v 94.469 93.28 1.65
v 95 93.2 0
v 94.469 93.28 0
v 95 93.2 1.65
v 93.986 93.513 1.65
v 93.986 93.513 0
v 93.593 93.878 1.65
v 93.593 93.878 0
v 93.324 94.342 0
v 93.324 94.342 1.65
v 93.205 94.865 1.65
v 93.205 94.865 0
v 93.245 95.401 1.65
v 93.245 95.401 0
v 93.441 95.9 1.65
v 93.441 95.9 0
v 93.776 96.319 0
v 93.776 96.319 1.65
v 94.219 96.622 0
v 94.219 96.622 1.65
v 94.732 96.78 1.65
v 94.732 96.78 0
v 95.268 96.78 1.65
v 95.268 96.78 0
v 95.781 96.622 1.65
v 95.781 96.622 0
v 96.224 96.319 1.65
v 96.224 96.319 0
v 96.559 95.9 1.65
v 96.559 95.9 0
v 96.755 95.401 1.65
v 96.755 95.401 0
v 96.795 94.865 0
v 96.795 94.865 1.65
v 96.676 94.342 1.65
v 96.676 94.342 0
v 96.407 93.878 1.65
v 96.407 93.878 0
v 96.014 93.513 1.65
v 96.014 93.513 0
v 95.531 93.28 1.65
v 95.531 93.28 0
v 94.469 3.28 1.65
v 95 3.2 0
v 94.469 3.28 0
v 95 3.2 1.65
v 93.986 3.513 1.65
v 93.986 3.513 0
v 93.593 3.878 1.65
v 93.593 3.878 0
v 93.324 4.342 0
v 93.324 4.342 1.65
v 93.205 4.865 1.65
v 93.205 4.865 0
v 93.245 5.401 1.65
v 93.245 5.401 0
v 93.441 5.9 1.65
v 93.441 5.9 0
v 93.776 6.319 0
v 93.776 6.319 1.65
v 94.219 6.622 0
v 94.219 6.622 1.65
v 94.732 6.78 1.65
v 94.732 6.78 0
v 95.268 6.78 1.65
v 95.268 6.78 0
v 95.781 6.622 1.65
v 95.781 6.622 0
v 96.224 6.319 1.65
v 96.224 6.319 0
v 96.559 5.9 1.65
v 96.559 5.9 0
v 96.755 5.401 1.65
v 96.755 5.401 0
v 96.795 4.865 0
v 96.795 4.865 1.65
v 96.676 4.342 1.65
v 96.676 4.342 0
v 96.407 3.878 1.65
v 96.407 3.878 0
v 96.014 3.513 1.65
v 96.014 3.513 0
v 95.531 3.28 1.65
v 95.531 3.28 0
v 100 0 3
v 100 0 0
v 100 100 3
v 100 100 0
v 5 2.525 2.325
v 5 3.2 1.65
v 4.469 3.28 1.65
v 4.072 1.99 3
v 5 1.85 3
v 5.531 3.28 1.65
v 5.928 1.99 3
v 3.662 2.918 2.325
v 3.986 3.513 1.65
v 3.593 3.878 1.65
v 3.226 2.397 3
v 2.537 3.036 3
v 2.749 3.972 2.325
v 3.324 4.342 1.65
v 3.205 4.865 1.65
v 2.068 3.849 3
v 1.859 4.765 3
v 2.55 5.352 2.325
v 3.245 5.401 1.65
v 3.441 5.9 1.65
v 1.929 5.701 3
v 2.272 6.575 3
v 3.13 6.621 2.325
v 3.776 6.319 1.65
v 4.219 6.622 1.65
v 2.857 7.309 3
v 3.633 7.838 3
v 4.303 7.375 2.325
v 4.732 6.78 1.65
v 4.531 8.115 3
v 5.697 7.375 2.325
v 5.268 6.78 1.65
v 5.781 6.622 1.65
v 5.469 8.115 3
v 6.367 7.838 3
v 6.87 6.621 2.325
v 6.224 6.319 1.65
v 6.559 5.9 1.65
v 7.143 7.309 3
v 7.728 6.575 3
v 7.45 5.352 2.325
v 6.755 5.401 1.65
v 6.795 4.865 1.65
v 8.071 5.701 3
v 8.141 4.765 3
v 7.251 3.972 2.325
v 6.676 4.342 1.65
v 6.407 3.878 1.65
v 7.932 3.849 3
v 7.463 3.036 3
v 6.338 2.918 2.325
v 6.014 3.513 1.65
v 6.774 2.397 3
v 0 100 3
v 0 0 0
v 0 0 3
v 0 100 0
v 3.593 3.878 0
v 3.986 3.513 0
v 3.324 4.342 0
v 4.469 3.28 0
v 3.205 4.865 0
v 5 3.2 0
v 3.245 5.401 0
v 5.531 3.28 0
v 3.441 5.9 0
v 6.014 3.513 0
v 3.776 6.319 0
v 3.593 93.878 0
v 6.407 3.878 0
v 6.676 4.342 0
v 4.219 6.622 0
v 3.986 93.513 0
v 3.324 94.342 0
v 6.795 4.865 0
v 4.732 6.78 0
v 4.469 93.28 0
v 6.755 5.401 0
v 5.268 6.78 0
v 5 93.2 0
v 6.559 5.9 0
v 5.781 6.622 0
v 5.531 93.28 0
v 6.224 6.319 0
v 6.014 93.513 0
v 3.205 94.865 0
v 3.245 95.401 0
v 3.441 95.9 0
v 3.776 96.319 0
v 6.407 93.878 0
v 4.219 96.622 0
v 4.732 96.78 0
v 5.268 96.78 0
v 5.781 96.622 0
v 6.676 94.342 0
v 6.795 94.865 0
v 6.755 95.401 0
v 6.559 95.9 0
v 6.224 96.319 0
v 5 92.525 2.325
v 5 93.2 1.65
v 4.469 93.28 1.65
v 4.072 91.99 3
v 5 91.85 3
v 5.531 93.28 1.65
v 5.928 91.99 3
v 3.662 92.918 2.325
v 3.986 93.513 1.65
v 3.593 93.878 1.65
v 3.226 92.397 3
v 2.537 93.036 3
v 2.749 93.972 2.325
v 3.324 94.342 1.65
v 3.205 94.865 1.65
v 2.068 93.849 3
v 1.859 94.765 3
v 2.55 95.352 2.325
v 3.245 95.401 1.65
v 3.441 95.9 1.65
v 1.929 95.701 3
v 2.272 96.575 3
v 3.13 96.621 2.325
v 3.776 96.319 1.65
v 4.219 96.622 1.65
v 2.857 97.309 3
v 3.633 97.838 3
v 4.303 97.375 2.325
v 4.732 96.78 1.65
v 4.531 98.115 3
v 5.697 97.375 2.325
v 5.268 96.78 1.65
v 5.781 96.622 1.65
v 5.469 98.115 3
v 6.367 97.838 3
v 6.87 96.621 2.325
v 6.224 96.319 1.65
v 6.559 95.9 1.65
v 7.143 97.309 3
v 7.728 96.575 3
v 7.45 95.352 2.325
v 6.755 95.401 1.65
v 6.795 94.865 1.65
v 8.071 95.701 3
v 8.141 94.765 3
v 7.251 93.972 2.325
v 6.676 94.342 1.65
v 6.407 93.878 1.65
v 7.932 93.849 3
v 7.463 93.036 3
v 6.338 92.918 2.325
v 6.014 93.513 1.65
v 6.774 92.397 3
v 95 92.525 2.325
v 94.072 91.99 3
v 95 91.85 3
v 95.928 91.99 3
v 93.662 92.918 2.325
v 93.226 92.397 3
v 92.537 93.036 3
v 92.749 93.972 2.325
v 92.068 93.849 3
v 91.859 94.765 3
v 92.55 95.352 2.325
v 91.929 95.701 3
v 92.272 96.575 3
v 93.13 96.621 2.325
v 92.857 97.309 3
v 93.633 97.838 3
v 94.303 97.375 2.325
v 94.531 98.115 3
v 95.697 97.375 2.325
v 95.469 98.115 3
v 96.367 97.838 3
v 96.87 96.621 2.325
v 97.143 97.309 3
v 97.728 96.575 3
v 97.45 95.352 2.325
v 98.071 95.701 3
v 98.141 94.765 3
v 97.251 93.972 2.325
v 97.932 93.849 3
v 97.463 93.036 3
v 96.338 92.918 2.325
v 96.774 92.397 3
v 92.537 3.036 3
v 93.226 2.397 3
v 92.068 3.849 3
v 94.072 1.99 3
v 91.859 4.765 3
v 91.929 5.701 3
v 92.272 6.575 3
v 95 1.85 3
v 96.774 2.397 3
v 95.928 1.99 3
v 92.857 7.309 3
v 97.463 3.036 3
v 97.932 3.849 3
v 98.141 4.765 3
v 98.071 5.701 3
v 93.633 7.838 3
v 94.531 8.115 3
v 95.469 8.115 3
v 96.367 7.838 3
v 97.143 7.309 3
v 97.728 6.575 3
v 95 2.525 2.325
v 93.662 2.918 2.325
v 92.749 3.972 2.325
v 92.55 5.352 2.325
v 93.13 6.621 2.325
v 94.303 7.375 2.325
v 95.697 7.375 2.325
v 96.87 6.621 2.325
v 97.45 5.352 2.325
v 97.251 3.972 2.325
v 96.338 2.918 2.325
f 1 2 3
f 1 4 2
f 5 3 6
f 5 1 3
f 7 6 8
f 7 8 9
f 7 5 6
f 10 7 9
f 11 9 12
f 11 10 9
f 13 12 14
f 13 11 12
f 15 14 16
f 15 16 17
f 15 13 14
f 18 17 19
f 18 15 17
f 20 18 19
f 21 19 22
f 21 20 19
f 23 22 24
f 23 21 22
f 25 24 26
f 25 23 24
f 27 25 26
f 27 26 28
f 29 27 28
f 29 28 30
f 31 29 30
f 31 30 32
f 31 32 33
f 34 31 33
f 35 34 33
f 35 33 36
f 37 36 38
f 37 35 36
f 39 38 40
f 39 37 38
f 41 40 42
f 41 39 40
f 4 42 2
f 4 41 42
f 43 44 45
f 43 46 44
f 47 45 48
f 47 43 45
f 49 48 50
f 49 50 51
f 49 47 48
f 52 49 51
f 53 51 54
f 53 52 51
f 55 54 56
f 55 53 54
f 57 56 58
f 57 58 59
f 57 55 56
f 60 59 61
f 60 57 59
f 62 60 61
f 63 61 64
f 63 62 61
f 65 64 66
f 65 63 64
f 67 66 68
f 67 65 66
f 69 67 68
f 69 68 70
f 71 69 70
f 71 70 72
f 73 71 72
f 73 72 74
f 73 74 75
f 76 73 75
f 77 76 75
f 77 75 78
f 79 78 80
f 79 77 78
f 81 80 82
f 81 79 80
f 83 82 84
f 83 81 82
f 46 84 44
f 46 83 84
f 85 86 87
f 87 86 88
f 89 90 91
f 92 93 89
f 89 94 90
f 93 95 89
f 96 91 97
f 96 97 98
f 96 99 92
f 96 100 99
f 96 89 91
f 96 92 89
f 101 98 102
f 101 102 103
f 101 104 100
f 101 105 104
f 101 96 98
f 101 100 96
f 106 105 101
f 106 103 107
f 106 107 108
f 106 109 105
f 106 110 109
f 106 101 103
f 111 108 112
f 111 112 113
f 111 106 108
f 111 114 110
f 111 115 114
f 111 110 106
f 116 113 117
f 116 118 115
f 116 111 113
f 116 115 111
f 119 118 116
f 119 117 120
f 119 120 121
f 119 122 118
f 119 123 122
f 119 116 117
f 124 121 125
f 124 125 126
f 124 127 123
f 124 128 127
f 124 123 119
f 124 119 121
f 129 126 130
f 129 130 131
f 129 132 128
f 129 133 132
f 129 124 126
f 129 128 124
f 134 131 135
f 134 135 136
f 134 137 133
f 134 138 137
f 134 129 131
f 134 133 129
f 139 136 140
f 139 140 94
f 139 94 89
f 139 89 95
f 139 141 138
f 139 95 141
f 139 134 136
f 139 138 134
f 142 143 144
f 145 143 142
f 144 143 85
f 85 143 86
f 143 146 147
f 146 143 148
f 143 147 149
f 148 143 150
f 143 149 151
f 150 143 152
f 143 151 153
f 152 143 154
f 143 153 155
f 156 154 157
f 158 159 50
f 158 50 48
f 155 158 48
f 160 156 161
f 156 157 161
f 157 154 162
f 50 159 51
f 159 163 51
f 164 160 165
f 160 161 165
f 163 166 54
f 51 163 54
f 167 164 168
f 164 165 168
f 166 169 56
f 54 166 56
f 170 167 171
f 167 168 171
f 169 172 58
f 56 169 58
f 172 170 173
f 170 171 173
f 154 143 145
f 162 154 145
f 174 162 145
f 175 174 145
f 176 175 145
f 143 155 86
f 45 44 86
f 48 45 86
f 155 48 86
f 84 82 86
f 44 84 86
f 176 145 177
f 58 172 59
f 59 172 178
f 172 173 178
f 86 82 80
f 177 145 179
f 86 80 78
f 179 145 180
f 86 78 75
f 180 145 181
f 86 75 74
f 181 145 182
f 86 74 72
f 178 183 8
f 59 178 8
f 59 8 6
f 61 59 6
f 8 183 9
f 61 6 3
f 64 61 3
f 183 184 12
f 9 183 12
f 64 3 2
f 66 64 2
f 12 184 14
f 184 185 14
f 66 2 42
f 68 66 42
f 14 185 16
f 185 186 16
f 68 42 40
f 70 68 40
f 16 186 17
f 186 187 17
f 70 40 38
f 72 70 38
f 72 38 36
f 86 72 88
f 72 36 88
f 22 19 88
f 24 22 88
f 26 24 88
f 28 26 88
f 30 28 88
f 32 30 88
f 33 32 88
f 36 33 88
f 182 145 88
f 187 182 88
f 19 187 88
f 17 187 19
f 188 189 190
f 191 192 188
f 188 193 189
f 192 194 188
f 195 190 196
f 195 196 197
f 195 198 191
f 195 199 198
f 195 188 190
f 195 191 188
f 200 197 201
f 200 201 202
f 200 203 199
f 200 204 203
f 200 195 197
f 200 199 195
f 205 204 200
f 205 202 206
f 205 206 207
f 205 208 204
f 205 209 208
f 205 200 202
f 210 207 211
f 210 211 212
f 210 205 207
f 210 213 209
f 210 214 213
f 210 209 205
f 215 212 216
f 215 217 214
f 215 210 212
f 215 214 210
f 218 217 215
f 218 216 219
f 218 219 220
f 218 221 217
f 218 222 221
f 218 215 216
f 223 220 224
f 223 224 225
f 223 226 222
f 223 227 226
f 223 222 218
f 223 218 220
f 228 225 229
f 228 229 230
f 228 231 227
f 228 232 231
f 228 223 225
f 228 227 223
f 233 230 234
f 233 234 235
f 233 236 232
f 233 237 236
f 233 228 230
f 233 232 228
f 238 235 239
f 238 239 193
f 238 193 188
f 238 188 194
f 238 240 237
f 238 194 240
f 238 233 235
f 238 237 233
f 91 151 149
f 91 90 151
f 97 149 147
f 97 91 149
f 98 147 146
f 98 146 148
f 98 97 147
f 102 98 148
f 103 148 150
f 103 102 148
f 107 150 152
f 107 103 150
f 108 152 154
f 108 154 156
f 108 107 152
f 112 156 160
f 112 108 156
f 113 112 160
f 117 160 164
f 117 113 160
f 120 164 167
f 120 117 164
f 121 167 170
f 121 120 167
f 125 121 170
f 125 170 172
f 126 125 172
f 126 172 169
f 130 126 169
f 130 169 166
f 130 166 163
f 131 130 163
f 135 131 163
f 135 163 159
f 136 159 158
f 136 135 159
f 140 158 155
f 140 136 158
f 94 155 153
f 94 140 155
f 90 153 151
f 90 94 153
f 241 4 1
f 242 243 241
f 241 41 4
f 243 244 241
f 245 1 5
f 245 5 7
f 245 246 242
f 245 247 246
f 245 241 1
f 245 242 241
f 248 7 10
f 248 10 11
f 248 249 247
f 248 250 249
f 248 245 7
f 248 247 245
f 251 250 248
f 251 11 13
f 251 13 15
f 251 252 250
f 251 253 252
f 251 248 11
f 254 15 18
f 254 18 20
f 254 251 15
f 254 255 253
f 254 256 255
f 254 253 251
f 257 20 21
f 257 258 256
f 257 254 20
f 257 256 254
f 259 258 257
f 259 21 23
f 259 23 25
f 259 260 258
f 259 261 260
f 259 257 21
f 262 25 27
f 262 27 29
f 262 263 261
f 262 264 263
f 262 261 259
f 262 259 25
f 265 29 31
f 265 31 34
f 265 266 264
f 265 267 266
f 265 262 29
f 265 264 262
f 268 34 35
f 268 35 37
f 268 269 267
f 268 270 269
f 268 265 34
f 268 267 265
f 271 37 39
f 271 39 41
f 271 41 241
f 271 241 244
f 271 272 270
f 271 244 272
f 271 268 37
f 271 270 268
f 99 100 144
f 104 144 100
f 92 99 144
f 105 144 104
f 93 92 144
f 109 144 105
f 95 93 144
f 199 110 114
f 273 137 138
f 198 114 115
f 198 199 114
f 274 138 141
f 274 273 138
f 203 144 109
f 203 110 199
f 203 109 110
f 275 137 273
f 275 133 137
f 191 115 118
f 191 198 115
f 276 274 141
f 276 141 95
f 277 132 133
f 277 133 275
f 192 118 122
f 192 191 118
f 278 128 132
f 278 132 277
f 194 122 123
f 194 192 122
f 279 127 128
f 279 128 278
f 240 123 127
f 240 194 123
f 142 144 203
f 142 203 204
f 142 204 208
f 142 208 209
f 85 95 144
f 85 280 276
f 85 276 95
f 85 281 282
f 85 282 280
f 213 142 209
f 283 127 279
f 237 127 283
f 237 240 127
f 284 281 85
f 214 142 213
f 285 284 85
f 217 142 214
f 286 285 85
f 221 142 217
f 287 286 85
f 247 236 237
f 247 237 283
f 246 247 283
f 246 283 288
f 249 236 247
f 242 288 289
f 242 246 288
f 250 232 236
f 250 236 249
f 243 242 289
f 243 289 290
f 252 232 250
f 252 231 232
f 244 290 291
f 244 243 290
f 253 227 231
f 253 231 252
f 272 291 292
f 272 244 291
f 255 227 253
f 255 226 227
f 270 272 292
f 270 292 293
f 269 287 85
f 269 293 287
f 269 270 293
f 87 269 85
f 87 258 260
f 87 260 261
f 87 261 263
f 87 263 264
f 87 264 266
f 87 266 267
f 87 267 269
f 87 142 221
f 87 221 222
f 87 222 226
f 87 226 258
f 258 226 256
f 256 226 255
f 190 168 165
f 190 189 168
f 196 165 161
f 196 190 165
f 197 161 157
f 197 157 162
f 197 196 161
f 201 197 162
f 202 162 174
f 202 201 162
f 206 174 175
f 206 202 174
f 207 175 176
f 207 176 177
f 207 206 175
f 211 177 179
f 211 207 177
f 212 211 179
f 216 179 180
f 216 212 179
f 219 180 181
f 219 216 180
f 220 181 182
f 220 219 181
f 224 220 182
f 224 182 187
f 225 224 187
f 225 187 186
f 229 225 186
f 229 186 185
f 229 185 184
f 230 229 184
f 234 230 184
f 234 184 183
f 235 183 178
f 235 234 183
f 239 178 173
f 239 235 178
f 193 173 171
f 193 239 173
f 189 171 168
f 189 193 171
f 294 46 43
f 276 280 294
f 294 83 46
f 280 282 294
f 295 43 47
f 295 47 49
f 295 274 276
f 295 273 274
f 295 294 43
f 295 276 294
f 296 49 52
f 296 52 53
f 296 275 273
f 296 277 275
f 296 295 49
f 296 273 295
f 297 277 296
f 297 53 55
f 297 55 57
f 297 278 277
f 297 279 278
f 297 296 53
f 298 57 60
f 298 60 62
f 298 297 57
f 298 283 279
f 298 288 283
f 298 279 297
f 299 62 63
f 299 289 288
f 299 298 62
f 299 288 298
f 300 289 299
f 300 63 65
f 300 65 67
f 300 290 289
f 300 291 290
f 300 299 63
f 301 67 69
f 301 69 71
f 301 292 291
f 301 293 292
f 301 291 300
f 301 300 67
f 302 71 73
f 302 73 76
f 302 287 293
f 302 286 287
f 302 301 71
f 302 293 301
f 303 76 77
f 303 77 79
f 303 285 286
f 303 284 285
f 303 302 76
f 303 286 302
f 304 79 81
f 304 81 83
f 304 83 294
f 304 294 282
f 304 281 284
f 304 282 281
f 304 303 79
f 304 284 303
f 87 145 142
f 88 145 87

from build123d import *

# Parameters (mm, degrees)
ESQUISSE1_W                                 = 100
ESQUISSE1_H                                 = 100
BOSS_EXTRU_1_DEPTH                          = 3
FRAISAGE_POUR_VIS_T_TE_FRAIS_E_M31_AT_COUNT = 2
FRAISAGE_POUR_VIS_T_TE_FRAIS_E_M31_AT_PITCH = 90
FRAISAGE_POUR_VIS_T_TE_FRAIS_E_M31_2_COUNT  = 2
FRAISAGE_POUR_VIS_T_TE_FRAIS_E_M31_2_PITCH  = 127.279220614
FRAISAGE_POUR_VIS_T_TE_FRAIS_E_M31_3_COUNT  = 2
FRAISAGE_POUR_VIS_T_TE_FRAIS_E_M31_3_PITCH  = 90


with BuildPart() as part:
    # Esquisse1 → Boss.-Extru.1 (new body)
    with BuildSketch(Plane.XY):
        with Locations((50, 50)):
            Rectangle(ESQUISSE1_W, ESQUISSE1_H)
    extrude(amount=BOSS_EXTRU_1_DEPTH)

    # Esquisse3 → Fraisage pour vis à tête fraisée M31 (revolve, cut)
    with BuildSketch(Plane(origin=(5, 95, 3), x_dir=(0, -1, 0), z_dir=(1, 0, 0))):
        Polygon((0, 0), (0, 3), (1.8, 3), (1.8, 1.35), (3.15, 0), align=None)
    fraisage_pour_vis_t_te_frais_e_m31 = revolve(axis=Axis((5, 95, 9.35), (0, 0, -1)), mode=Mode.SUBTRACT)

    # Fraisage pour vis à tête fraisée M31 at: Fraisage pour vis à tête fraisée M31 ×2
    with Locations(*[(i * FRAISAGE_POUR_VIS_T_TE_FRAIS_E_M31_AT_PITCH, 0, 0) for i in range(1, FRAISAGE_POUR_VIS_T_TE_FRAIS_E_M31_AT_COUNT)]):
        add(fraisage_pour_vis_t_te_frais_e_m31, mode=Mode.SUBTRACT)

    # Fraisage pour vis _ t_te frais_e M31 2: Fraisage pour vis à tête fraisée M31 ×2
    with Locations(*[Vector(0.707106781, -0.707106781, 0) * (i * FRAISAGE_POUR_VIS_T_TE_FRAIS_E_M31_2_PITCH) for i in range(1, FRAISAGE_POUR_VIS_T_TE_FRAIS_E_M31_2_COUNT)]):
        add(fraisage_pour_vis_t_te_frais_e_m31, mode=Mode.SUBTRACT)

    # Fraisage pour vis _ t_te frais_e M31 3: Fraisage pour vis à tête fraisée M31 ×2
    with Locations(*[(0, -i * FRAISAGE_POUR_VIS_T_TE_FRAIS_E_M31_3_PITCH, 0) for i in range(1, FRAISAGE_POUR_VIS_T_TE_FRAIS_E_M31_3_COUNT)]):
        add(fraisage_pour_vis_t_te_frais_e_m31, mode=Mode.SUBTRACT)


solid = part.part
